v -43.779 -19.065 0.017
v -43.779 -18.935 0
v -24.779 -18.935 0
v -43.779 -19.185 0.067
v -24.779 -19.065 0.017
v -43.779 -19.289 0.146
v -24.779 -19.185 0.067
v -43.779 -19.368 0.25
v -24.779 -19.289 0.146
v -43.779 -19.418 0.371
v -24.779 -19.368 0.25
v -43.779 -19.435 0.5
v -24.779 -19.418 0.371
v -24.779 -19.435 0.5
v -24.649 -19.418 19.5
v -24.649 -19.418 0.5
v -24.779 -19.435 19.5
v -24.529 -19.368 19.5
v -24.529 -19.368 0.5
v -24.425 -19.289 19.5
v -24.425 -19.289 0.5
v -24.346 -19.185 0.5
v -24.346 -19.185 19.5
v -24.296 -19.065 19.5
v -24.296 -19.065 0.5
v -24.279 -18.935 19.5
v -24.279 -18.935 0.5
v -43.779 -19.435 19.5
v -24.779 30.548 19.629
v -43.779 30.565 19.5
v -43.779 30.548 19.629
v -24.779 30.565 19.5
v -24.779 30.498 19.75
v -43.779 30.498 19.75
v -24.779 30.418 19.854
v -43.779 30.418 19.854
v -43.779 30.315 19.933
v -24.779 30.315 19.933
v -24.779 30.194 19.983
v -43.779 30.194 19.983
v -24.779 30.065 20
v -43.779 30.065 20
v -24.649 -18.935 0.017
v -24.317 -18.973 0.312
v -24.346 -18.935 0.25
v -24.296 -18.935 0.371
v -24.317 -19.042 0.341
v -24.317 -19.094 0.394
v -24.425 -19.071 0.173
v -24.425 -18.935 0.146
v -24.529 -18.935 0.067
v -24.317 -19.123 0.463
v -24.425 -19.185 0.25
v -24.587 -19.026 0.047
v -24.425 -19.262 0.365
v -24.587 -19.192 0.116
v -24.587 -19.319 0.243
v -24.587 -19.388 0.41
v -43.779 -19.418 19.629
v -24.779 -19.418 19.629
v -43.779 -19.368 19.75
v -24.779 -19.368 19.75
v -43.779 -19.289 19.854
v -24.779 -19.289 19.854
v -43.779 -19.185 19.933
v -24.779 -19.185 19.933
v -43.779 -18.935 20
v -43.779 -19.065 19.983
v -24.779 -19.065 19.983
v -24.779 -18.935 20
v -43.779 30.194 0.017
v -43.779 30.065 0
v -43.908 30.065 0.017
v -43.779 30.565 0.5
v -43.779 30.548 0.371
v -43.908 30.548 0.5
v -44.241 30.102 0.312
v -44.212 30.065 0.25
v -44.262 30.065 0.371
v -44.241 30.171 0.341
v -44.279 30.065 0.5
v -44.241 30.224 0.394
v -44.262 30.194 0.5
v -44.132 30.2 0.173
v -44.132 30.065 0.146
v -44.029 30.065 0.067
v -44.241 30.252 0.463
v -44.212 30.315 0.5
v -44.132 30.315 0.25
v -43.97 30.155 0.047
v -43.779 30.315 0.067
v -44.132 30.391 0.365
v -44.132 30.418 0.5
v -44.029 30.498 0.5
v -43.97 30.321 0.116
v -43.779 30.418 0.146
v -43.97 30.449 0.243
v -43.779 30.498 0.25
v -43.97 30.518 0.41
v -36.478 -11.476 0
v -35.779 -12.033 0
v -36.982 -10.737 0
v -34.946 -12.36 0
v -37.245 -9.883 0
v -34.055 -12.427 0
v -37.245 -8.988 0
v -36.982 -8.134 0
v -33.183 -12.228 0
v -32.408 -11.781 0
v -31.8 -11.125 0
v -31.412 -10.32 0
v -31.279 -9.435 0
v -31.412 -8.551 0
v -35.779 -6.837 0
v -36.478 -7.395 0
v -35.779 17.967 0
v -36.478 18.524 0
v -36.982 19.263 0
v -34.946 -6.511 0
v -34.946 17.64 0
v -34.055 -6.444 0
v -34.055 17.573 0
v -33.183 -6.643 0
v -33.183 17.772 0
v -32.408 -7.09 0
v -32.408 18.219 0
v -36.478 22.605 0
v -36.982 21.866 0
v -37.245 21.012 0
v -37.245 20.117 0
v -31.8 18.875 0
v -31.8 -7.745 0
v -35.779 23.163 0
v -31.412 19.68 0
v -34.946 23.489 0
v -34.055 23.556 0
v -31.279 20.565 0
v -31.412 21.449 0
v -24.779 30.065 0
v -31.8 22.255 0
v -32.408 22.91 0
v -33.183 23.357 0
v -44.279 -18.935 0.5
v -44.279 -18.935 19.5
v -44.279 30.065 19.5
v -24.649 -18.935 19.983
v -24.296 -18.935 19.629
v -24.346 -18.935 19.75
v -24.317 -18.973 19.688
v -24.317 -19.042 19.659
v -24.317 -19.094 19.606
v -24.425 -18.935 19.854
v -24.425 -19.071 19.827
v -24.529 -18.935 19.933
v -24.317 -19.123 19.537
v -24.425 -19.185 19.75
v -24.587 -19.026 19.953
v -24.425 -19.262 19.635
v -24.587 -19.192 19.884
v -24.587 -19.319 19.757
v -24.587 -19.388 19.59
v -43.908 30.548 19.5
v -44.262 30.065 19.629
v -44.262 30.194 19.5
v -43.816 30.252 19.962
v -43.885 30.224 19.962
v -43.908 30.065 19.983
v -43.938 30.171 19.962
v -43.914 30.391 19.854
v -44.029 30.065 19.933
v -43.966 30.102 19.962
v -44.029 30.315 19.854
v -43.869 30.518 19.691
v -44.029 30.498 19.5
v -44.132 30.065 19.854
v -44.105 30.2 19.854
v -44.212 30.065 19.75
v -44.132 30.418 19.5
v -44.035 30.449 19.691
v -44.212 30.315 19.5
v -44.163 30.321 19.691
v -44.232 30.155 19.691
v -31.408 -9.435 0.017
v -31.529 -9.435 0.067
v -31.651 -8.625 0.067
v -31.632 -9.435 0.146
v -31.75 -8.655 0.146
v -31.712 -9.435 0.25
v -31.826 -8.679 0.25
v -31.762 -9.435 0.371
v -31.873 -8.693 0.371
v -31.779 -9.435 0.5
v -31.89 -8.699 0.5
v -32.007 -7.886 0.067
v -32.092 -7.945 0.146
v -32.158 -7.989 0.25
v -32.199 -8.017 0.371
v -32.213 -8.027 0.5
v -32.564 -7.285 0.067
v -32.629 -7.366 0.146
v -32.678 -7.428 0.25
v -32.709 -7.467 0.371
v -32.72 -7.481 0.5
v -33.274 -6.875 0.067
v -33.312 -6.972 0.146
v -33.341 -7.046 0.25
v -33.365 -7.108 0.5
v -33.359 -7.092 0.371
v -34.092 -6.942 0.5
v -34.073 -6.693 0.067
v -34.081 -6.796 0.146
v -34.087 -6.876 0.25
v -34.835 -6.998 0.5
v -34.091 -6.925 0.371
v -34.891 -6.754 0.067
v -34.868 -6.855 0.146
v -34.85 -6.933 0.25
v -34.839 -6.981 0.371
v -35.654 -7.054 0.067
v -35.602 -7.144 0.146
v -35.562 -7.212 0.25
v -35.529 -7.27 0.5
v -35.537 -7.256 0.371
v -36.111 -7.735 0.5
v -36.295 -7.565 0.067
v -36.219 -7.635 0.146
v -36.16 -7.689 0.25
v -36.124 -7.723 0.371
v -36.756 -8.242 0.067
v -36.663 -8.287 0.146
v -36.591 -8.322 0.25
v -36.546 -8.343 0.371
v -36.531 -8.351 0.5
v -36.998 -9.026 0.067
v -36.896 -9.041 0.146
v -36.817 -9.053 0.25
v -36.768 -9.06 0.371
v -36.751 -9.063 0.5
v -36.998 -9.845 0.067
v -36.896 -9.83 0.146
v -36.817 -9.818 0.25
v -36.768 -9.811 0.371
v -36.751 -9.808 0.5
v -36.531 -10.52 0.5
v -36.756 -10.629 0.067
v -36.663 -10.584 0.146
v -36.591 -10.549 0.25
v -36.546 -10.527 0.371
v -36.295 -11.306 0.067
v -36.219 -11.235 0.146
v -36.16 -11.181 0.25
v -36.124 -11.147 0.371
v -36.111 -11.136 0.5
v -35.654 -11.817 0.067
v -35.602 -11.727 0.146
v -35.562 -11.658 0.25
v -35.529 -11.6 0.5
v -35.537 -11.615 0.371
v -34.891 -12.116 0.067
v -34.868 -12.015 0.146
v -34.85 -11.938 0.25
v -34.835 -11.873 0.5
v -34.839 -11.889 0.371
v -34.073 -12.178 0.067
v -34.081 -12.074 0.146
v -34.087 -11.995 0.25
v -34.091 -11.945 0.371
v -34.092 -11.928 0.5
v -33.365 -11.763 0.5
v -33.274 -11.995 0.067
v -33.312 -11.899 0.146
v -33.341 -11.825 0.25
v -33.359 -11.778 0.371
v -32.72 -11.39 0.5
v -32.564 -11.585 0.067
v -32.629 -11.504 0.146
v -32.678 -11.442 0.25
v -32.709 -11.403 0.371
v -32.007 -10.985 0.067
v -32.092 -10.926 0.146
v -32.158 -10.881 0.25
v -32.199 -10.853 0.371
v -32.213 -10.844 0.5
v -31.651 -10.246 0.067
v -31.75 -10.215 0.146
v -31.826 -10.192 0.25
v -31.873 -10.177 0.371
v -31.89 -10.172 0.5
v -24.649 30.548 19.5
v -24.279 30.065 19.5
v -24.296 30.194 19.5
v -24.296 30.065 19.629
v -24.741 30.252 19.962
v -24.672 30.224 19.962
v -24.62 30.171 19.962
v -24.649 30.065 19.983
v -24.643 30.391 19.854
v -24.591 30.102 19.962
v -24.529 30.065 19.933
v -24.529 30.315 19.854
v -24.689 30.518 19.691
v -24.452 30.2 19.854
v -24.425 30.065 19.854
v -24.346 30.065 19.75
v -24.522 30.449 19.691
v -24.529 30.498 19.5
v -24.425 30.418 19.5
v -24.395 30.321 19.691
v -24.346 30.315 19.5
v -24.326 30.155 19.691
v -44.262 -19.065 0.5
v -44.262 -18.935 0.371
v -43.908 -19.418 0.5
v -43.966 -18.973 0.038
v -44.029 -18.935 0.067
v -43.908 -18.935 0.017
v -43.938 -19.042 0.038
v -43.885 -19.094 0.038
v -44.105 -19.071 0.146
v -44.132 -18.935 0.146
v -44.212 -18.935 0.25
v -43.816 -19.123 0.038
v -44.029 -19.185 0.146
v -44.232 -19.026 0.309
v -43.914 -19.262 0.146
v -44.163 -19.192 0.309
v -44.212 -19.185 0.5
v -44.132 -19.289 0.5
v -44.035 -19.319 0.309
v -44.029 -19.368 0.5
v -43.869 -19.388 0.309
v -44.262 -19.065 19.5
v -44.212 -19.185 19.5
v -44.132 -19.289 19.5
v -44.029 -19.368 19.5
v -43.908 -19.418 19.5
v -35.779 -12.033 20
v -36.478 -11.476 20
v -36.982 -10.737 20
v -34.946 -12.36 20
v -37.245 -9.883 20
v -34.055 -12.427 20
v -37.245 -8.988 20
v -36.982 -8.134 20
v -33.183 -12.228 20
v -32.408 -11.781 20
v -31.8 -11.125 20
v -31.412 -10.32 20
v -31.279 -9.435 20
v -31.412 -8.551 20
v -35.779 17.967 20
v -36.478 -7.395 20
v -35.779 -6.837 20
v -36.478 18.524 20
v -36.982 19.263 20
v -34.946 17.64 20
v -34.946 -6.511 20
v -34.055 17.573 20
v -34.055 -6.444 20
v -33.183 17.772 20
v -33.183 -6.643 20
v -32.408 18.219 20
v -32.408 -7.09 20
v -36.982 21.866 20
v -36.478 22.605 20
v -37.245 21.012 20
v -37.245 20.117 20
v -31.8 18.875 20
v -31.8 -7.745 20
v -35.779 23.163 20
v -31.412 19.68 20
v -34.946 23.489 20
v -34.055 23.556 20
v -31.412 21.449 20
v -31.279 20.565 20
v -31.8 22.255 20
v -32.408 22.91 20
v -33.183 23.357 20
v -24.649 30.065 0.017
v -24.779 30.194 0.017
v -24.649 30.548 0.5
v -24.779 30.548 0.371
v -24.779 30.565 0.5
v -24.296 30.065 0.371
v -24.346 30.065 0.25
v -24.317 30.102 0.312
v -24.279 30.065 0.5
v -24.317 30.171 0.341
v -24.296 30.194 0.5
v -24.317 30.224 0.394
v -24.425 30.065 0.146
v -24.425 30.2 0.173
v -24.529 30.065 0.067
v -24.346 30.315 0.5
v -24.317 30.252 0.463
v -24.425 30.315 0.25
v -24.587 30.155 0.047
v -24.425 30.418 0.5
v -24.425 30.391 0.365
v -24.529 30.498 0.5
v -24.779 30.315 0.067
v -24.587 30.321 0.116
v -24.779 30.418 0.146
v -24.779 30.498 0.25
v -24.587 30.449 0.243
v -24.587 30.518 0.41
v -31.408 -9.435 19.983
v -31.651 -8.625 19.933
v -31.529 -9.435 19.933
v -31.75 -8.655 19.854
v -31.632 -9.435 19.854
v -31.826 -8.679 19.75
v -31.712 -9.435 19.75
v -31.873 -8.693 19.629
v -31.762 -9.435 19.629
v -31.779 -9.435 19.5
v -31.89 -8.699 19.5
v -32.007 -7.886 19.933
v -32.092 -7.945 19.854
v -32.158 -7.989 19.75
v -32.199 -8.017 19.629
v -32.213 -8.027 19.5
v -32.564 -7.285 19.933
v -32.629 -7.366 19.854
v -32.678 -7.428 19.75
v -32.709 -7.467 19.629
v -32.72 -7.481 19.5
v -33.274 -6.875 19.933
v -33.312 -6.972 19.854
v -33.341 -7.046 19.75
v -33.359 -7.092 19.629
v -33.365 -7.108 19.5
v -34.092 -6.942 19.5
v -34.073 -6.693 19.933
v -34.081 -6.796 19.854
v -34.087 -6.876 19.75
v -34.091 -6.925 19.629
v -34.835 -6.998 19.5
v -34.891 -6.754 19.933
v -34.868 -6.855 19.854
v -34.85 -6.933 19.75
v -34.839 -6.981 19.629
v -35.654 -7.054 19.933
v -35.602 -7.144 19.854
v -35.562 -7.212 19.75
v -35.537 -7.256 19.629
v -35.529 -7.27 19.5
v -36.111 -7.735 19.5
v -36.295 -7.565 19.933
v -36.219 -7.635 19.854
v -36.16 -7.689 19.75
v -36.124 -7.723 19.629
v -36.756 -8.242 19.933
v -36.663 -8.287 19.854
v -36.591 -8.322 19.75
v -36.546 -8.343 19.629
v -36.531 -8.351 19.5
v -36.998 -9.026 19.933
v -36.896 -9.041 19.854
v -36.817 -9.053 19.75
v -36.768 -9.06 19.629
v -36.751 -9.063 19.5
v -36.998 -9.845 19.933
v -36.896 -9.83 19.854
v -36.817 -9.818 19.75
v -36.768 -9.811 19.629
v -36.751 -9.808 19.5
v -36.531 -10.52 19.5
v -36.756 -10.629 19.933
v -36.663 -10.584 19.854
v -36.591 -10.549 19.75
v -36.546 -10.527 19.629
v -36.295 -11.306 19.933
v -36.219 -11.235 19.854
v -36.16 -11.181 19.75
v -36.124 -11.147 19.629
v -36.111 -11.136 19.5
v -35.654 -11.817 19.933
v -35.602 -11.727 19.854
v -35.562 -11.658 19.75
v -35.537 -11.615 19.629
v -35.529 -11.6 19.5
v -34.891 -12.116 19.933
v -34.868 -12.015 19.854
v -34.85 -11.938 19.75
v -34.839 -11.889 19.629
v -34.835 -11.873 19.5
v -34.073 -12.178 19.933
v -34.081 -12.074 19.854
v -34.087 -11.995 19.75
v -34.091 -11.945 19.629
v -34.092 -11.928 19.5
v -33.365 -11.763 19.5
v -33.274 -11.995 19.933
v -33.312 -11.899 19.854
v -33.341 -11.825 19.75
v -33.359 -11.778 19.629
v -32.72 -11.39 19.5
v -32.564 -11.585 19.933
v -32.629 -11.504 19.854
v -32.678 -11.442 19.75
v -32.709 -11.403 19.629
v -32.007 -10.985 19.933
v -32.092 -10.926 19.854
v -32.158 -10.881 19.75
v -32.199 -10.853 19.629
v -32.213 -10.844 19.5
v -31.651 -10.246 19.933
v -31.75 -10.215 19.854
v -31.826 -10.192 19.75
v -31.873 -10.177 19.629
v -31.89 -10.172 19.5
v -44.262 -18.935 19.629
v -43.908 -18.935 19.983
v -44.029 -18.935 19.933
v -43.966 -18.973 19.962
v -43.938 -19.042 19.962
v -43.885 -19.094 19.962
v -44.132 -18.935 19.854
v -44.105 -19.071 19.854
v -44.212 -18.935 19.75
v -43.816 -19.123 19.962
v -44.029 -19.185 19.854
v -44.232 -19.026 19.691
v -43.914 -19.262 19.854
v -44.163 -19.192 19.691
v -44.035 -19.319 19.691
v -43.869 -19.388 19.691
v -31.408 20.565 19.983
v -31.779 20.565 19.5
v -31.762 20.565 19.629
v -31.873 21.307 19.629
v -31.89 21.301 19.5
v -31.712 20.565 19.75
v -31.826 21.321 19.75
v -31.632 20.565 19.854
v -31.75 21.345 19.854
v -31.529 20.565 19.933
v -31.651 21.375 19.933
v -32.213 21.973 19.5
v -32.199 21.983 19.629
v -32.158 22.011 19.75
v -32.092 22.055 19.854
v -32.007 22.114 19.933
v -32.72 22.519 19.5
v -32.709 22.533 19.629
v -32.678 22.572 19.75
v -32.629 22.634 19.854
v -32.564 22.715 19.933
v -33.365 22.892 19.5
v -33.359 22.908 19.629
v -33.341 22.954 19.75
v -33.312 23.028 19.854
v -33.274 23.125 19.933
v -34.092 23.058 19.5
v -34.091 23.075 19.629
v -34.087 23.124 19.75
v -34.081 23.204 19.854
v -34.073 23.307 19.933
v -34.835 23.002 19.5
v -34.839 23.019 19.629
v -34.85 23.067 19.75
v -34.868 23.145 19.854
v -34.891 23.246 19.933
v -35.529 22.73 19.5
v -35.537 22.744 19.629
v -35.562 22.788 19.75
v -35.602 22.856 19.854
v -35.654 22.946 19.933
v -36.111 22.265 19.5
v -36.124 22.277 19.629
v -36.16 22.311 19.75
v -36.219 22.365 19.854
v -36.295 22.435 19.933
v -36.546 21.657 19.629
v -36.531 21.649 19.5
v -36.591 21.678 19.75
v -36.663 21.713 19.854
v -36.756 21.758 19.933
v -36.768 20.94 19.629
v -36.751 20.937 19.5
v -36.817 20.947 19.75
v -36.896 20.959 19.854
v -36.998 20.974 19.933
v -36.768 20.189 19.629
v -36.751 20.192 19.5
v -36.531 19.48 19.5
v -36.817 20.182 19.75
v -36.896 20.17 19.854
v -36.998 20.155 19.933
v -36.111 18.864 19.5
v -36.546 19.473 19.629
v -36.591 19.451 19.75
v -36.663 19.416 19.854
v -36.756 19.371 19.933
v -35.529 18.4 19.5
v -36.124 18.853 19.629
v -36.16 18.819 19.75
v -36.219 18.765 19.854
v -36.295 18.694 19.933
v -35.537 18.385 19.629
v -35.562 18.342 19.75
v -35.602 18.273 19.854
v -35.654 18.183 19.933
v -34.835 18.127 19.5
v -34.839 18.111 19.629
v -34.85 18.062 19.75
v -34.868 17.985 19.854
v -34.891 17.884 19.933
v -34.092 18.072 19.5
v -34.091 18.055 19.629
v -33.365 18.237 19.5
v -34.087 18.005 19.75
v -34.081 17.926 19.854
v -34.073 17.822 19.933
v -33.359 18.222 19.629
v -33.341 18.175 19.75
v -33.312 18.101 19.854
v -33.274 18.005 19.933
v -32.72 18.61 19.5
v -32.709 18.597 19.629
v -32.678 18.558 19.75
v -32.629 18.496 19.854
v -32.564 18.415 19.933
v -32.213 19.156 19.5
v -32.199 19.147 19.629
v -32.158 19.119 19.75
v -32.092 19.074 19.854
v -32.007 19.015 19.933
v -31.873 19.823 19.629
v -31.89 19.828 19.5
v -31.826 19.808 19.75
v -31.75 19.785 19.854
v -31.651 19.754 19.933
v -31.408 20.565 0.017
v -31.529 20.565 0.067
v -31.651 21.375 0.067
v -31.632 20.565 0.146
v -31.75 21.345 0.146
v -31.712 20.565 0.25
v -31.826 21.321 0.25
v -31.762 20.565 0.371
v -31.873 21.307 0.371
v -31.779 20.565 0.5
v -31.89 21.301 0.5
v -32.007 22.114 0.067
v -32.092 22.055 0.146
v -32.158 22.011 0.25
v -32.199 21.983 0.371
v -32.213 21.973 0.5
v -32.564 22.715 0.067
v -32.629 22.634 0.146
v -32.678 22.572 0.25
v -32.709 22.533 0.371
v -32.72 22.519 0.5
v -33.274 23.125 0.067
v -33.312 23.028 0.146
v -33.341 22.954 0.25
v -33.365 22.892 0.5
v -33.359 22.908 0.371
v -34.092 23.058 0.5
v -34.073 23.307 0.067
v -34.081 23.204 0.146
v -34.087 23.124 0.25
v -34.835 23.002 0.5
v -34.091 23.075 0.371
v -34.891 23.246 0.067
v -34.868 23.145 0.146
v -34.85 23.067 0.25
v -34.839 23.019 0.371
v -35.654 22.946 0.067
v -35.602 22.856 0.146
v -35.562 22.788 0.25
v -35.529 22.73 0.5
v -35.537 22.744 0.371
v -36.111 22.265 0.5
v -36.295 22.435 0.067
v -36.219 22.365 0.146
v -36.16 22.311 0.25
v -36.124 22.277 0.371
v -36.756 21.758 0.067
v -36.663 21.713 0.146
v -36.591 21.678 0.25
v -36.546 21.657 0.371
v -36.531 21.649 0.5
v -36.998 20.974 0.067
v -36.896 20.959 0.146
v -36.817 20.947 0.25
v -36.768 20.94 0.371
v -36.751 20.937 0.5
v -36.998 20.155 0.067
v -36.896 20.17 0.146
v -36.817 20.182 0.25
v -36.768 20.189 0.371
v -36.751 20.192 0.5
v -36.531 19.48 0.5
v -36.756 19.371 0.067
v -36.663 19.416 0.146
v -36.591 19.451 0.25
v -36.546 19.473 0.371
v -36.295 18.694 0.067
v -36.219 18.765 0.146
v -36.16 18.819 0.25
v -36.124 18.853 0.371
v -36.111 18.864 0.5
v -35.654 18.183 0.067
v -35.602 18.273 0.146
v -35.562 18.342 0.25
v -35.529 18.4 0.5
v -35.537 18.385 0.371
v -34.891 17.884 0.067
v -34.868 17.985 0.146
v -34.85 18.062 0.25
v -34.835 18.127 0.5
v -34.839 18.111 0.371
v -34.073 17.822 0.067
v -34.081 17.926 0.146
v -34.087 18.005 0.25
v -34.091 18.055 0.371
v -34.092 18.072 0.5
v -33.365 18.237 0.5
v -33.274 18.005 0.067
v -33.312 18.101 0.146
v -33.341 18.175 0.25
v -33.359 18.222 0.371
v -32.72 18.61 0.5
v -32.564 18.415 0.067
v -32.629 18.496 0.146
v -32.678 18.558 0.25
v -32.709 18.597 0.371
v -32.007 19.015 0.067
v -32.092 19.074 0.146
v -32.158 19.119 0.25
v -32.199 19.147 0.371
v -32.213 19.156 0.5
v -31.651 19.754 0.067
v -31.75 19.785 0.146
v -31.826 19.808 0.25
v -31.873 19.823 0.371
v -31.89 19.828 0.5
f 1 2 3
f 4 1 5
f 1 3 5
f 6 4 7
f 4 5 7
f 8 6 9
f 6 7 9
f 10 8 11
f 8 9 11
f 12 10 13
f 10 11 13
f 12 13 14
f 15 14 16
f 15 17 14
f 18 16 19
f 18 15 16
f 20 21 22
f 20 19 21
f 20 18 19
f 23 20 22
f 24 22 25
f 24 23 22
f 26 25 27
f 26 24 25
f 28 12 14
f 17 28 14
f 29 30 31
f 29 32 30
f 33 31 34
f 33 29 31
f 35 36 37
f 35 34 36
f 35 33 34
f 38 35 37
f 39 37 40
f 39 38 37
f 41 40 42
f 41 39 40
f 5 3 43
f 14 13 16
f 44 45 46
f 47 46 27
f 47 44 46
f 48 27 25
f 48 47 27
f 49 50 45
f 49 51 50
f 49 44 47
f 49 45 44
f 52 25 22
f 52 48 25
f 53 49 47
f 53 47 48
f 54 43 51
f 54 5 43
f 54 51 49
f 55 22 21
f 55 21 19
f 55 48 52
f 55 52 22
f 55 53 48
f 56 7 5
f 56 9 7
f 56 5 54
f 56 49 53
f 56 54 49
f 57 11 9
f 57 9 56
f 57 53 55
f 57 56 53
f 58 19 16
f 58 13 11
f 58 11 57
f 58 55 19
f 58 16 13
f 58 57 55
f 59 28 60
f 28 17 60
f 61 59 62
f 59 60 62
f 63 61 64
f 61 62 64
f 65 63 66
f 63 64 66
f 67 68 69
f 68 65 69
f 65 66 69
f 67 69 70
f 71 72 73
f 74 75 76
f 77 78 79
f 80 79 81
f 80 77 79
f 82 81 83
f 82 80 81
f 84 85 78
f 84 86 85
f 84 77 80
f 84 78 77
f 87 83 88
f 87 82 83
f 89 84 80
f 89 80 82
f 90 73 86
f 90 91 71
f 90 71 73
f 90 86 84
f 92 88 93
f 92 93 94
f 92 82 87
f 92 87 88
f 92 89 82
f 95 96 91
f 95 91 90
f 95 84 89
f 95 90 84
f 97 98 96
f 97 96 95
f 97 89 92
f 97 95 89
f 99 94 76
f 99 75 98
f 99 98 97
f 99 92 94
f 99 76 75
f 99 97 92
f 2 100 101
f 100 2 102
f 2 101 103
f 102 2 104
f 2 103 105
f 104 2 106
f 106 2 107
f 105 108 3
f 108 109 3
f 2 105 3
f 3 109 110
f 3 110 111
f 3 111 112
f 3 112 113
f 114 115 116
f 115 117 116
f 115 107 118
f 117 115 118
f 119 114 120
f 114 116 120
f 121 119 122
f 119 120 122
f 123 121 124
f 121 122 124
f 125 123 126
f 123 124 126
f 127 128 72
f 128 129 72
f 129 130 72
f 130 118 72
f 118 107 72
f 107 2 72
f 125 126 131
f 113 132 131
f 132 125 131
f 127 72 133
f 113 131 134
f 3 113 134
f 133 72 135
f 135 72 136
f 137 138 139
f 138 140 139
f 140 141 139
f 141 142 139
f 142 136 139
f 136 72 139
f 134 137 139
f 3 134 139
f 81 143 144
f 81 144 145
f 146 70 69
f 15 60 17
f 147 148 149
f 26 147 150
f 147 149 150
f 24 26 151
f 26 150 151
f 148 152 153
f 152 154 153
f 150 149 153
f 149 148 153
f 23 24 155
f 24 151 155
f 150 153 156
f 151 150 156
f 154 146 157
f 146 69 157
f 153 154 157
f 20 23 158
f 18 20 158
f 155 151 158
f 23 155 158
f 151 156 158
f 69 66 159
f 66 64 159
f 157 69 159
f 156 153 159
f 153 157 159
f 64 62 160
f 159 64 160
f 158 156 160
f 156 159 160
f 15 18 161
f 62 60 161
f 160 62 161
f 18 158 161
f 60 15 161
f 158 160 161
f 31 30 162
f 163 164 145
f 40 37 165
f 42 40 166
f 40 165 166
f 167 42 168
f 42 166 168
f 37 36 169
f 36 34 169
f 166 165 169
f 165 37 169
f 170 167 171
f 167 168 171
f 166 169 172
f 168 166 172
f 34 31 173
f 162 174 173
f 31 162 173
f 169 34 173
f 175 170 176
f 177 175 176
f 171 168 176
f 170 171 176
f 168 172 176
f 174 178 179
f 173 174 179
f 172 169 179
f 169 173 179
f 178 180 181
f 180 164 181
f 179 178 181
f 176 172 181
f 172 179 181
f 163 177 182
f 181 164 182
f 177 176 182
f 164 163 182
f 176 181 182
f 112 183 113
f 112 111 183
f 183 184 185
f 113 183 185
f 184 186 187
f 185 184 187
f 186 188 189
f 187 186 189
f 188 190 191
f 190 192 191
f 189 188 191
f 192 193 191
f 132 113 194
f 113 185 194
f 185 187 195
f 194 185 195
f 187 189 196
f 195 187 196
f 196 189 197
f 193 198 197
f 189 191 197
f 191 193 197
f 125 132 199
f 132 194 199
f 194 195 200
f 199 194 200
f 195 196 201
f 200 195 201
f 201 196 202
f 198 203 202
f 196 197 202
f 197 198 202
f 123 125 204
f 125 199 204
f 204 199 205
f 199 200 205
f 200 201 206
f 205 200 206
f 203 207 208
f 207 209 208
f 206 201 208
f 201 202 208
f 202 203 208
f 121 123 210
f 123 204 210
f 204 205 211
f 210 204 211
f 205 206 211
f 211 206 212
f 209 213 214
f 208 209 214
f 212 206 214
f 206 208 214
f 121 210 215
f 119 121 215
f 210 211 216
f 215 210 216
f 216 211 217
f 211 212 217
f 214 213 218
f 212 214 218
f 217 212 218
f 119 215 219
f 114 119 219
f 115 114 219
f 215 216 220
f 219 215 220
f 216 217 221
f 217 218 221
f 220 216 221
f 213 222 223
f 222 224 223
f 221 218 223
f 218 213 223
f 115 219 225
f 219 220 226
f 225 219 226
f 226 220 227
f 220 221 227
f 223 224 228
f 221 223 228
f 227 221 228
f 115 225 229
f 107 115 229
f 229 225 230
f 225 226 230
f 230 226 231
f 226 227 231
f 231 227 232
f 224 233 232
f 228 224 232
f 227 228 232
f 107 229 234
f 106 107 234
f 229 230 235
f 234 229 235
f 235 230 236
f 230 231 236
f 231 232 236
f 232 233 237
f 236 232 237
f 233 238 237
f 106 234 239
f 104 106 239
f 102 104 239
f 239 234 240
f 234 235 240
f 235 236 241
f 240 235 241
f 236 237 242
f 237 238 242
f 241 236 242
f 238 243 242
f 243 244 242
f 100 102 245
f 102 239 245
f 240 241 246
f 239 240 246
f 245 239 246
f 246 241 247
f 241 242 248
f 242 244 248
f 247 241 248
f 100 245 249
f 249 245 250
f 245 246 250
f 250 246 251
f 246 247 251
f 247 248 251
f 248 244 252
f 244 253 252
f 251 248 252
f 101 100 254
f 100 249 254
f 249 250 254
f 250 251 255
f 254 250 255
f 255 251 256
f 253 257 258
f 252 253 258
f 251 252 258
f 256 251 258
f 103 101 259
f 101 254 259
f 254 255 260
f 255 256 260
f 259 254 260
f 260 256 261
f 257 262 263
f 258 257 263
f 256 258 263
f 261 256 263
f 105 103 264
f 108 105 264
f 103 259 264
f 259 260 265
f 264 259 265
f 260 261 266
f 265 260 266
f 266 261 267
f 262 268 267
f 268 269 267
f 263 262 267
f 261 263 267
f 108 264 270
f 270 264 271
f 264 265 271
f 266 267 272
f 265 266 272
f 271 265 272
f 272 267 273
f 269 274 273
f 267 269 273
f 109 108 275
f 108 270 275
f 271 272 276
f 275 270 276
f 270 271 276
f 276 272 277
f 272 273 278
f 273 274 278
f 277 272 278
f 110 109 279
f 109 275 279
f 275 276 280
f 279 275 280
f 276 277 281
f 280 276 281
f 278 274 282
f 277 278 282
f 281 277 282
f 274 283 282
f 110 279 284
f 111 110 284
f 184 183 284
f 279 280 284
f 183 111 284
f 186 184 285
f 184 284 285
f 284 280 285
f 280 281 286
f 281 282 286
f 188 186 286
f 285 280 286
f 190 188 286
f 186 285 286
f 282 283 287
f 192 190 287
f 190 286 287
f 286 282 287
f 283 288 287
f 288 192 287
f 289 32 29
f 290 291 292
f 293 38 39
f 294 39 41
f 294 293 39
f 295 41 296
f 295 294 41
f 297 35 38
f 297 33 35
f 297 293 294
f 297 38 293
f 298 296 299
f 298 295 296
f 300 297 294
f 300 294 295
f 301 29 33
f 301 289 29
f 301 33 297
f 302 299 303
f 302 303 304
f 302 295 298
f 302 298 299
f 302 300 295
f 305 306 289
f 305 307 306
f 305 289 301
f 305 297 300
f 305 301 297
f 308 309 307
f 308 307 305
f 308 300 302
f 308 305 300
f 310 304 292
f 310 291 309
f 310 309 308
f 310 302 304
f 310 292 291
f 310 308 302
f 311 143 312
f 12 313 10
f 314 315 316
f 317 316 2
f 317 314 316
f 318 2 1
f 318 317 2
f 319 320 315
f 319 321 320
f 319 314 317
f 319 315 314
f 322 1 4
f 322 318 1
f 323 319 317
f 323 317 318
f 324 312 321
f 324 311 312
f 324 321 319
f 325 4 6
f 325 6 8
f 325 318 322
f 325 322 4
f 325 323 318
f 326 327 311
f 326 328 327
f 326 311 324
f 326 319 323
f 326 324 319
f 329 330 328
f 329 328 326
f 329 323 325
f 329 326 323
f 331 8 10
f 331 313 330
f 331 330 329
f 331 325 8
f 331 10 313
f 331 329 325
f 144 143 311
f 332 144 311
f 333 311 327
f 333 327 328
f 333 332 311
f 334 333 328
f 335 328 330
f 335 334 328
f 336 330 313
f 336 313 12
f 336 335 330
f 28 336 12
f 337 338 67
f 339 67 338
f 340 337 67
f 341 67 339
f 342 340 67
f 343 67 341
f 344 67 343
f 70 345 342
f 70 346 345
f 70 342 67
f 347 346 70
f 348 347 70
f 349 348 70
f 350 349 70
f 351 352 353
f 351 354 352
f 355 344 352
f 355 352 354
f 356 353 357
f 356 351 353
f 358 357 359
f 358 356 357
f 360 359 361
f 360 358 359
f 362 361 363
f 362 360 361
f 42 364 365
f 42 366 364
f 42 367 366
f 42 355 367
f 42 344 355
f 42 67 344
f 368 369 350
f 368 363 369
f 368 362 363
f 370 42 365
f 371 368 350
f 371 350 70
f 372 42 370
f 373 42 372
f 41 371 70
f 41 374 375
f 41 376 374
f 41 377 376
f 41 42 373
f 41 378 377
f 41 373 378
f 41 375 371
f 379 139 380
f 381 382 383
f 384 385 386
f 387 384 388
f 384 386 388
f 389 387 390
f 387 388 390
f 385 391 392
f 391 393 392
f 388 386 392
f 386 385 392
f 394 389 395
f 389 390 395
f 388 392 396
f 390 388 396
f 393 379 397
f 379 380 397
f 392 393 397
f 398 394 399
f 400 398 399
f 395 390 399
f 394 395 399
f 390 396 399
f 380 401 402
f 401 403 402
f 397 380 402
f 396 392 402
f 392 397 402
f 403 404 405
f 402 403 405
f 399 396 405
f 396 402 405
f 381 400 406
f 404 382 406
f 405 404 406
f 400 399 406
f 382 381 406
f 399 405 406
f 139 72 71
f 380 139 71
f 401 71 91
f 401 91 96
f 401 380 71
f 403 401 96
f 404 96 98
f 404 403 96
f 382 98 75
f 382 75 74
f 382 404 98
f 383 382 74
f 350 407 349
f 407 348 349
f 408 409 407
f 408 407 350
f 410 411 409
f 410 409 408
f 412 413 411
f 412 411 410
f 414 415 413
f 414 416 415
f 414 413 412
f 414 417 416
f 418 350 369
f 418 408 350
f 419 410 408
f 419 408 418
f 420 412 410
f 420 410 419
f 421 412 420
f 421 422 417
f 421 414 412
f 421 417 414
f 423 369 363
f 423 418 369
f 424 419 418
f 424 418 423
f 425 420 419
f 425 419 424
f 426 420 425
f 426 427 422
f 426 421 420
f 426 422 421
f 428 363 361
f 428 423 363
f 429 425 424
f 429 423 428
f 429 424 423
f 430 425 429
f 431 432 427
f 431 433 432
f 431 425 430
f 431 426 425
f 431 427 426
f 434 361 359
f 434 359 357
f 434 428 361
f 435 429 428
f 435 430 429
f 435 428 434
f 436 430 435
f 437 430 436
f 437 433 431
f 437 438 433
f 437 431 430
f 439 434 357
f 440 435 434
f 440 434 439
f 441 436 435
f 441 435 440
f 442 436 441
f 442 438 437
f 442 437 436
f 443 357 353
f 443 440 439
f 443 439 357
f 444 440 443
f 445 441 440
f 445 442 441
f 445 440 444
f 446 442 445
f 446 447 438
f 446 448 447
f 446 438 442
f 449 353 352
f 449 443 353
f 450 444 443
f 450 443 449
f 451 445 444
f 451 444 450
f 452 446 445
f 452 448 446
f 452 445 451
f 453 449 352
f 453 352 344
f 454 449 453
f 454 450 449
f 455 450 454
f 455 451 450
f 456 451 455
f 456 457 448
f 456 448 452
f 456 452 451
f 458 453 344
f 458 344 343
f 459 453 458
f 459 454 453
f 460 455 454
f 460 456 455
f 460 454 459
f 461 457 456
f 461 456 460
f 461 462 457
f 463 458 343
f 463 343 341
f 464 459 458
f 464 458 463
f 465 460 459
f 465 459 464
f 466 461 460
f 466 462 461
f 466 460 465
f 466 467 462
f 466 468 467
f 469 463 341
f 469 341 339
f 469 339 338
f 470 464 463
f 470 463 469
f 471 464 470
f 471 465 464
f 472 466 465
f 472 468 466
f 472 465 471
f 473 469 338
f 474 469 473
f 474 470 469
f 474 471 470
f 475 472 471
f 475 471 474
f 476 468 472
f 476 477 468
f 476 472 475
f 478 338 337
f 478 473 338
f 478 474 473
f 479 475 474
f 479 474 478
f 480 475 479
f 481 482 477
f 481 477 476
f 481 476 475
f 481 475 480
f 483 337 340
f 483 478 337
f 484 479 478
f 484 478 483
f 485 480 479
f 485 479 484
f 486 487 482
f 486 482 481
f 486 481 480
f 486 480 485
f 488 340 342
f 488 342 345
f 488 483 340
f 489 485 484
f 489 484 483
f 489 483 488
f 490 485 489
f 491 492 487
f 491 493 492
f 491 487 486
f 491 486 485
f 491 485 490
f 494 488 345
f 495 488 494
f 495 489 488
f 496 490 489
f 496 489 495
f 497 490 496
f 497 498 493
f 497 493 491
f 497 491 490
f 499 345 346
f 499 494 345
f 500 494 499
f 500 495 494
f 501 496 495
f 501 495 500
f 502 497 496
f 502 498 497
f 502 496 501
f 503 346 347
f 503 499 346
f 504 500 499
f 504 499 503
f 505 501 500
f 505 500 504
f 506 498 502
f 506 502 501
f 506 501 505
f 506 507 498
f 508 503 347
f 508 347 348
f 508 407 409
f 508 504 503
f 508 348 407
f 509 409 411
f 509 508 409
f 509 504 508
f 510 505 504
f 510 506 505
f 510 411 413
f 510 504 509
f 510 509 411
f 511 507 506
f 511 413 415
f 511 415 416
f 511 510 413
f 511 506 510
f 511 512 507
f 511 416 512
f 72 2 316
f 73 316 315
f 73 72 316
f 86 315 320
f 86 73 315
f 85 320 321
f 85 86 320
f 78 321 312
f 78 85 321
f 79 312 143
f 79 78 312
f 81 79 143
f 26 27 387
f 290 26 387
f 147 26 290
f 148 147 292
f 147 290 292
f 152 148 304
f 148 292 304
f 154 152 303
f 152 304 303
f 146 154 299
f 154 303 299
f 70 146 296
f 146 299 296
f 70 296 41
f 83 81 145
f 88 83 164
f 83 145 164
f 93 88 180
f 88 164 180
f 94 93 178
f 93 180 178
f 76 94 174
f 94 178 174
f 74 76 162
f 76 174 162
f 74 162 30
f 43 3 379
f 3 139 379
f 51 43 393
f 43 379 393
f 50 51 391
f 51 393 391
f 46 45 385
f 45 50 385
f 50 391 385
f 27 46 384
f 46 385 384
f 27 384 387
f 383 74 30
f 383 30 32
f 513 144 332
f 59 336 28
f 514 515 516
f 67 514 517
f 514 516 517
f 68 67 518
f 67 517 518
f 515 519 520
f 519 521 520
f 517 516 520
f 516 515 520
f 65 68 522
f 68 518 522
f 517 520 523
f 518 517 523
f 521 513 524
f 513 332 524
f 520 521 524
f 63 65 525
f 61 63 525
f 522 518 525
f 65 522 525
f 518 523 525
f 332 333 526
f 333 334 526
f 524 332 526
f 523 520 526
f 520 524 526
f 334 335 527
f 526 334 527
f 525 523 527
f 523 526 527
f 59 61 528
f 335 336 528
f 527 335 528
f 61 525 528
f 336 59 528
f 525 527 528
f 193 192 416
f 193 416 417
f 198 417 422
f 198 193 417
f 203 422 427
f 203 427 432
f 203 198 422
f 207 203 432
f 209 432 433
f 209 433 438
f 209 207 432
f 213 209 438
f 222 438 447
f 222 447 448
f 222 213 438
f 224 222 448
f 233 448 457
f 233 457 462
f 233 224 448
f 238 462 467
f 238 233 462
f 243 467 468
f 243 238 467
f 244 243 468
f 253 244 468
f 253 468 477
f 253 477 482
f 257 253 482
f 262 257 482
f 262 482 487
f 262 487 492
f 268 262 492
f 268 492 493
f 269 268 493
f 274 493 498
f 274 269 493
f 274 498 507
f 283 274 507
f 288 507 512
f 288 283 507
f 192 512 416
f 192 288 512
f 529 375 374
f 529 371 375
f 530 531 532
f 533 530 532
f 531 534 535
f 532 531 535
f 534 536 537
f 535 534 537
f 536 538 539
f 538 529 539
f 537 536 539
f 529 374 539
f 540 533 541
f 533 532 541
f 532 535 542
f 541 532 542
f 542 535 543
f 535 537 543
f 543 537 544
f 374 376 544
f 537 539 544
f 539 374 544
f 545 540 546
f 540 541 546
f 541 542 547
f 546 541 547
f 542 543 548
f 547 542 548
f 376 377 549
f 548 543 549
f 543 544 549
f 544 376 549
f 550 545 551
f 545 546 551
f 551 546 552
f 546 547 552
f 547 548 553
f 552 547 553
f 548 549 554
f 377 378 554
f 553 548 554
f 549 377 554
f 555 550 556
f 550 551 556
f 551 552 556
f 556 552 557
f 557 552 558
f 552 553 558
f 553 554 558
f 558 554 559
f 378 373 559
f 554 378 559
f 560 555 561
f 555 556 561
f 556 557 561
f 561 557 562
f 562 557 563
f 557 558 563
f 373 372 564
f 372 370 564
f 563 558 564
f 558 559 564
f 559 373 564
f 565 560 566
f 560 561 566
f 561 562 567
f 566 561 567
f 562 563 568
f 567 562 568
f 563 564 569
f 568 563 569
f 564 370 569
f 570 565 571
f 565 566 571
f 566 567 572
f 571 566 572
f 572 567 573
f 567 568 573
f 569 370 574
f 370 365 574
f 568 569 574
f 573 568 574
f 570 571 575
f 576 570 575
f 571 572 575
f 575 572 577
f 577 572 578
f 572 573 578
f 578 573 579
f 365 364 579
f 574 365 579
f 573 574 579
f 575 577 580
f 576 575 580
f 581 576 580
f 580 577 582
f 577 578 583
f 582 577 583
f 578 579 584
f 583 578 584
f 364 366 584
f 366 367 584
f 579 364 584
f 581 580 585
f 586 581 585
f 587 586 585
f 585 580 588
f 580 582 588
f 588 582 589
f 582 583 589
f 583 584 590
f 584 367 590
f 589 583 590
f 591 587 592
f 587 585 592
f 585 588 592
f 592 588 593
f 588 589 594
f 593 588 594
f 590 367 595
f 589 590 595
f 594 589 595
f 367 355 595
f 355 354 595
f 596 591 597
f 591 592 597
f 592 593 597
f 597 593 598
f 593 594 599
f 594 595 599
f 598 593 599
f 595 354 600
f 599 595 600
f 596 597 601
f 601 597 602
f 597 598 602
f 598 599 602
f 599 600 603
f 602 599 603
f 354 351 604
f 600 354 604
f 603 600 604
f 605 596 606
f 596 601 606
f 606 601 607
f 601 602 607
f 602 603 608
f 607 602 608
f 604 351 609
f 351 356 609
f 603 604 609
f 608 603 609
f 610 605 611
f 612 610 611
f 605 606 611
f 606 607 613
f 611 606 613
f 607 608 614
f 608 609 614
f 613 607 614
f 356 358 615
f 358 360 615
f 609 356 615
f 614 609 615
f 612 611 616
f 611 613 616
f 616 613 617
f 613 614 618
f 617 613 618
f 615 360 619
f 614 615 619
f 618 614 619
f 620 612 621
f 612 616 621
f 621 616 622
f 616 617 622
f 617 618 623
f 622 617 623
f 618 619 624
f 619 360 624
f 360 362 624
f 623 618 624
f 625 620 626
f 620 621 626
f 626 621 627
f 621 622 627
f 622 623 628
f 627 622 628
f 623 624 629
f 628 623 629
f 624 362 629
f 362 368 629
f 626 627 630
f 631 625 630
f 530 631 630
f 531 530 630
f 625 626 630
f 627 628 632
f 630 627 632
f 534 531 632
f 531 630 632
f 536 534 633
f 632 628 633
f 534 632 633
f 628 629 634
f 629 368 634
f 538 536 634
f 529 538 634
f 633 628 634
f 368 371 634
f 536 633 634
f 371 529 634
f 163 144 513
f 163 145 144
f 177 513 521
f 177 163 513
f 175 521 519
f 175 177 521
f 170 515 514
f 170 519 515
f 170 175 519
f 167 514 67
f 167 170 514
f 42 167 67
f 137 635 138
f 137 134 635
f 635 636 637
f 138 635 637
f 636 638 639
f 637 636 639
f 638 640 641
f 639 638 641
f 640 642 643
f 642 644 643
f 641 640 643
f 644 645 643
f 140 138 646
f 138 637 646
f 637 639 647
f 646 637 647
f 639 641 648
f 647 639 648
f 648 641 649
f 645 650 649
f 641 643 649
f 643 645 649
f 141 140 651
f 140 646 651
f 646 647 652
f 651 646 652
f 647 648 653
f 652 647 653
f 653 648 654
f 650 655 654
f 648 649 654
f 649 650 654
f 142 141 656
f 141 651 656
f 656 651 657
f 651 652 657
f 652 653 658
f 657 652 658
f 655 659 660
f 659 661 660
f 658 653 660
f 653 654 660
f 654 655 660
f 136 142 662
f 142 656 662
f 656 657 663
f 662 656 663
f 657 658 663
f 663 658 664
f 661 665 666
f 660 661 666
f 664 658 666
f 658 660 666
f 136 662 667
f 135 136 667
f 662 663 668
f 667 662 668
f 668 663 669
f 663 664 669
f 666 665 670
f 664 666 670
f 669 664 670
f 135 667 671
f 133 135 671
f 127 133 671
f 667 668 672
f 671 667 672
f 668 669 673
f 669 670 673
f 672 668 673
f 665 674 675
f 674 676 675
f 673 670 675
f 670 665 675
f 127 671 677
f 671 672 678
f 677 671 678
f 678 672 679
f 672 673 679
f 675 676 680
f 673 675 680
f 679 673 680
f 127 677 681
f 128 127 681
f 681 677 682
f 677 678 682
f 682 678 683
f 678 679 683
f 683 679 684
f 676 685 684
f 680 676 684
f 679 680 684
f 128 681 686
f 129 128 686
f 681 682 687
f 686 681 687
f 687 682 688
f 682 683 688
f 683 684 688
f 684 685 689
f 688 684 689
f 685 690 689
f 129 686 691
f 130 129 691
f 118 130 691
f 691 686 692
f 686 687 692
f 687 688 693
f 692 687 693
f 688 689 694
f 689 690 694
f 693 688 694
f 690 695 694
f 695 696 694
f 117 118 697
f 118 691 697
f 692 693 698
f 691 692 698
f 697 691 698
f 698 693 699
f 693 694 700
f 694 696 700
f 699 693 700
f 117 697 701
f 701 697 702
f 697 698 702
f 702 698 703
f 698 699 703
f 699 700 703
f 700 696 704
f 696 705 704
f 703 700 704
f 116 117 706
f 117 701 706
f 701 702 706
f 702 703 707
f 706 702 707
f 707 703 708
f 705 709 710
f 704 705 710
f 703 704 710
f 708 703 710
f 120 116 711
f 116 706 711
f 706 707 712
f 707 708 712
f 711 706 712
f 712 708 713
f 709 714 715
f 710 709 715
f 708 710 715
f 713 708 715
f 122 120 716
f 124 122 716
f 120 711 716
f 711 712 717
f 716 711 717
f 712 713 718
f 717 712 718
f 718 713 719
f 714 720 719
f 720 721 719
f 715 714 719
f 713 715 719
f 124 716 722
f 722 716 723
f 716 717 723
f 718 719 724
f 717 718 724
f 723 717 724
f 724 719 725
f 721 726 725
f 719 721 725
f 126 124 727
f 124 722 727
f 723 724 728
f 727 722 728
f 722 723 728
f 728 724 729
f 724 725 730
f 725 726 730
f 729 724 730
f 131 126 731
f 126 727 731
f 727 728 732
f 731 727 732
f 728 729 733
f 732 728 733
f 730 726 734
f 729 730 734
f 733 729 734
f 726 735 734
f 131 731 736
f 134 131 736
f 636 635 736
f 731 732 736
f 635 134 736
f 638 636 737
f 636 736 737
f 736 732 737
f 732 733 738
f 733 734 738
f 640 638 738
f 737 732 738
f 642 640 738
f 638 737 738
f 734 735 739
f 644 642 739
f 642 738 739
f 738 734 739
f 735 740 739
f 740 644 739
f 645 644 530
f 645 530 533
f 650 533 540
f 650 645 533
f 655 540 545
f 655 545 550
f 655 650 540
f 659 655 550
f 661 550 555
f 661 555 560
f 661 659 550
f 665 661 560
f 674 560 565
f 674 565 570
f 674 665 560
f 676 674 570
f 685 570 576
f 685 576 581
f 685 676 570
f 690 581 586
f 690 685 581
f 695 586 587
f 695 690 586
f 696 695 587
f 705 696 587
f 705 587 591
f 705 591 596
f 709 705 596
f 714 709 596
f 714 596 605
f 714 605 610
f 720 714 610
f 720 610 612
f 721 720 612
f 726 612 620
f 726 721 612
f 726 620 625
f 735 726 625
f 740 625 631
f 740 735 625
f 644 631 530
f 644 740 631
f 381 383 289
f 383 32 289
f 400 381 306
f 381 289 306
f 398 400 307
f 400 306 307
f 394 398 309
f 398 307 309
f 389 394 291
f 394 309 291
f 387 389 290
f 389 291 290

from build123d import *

# Parameters (mm, degrees)
F0_W     = 20
F0_H     = 50
F0_R     = 2.5
F1_DEPTH = 20
F2_R     = 0.5
F3_R     = 0.5
F4_R     = 0.5
F5_R     = 0.5


with BuildPart() as f1:
    # F0 (on Top) → F1 (new body)
    with BuildSketch(Plane.XY):
        with Locations((-34.2786995421, 5.5646058172)):
            Rectangle(F0_W, F0_H)
        with Locations((-34.2786995421, -9.4353941828)):
            Circle(F0_R, mode=Mode.SUBTRACT)
        with Locations((-34.2786995421, 20.5646058172)):
            Circle(F0_R, mode=Mode.SUBTRACT)
    extrude(amount=F1_DEPTH)

    # F2
    f2_edges = [f1.edges().sort_by_distance(p)[0] for p in [
        (-36.7787, 20.564606, 20),
    ]]
    fillet(f2_edges, radius=F2_R)

    # F3
    f3_edges = [f1.edges().sort_by_distance(p)[0] for p in [
        (-31.7787, -9.435394, 10),
        (-36.7787, -9.435394, 0),
        (-36.7787, -9.435394, 20),
    ]]
    fillet(f3_edges, radius=F3_R)

    # F4
    f4_edges = [f1.edges().sort_by_distance(p)[0] for p in [
        (-36.7787, 20.564606, 0),
    ]]
    fillet(f4_edges, radius=F4_R)

    # F5
    f5_edges = [f1.edges().sort_by_distance(p)[0] for p in [
        (-44.2787, -19.435394, 10),
        (-37.2787, 20.564606, 0),
        (-37.2787, -9.435394, 0),
        (-34.2787, 30.564606, 0),
        (-44.2787, 5.564606, 0),
        (-34.2787, -19.435394, 0),
        (-24.2787, 5.564606, 0),
        (-24.2787, 30.564606, 10),
        (-44.2787, 30.564606, 10),
        (-34.2787, 30.564606, 20),
        (-44.2787, 5.564606, 20),
        (-37.2787, -9.435394, 20),
        (-37.2787, 20.564606, 20),
        (-34.2787, -19.435394, 20),
        (-24.2787, 5.564606, 20),
        (-24.2787, -19.435394, 10),
        (-36.7787, -9.435394, 19.5),
        (-36.7787, 20.564606, 19.5),
        (-36.7787, -9.435394, 0.5),
        (-36.7787, 20.564606, 0.5),
    ]]
    fillet(f5_edges, radius=F5_R)


solid = f1.part
